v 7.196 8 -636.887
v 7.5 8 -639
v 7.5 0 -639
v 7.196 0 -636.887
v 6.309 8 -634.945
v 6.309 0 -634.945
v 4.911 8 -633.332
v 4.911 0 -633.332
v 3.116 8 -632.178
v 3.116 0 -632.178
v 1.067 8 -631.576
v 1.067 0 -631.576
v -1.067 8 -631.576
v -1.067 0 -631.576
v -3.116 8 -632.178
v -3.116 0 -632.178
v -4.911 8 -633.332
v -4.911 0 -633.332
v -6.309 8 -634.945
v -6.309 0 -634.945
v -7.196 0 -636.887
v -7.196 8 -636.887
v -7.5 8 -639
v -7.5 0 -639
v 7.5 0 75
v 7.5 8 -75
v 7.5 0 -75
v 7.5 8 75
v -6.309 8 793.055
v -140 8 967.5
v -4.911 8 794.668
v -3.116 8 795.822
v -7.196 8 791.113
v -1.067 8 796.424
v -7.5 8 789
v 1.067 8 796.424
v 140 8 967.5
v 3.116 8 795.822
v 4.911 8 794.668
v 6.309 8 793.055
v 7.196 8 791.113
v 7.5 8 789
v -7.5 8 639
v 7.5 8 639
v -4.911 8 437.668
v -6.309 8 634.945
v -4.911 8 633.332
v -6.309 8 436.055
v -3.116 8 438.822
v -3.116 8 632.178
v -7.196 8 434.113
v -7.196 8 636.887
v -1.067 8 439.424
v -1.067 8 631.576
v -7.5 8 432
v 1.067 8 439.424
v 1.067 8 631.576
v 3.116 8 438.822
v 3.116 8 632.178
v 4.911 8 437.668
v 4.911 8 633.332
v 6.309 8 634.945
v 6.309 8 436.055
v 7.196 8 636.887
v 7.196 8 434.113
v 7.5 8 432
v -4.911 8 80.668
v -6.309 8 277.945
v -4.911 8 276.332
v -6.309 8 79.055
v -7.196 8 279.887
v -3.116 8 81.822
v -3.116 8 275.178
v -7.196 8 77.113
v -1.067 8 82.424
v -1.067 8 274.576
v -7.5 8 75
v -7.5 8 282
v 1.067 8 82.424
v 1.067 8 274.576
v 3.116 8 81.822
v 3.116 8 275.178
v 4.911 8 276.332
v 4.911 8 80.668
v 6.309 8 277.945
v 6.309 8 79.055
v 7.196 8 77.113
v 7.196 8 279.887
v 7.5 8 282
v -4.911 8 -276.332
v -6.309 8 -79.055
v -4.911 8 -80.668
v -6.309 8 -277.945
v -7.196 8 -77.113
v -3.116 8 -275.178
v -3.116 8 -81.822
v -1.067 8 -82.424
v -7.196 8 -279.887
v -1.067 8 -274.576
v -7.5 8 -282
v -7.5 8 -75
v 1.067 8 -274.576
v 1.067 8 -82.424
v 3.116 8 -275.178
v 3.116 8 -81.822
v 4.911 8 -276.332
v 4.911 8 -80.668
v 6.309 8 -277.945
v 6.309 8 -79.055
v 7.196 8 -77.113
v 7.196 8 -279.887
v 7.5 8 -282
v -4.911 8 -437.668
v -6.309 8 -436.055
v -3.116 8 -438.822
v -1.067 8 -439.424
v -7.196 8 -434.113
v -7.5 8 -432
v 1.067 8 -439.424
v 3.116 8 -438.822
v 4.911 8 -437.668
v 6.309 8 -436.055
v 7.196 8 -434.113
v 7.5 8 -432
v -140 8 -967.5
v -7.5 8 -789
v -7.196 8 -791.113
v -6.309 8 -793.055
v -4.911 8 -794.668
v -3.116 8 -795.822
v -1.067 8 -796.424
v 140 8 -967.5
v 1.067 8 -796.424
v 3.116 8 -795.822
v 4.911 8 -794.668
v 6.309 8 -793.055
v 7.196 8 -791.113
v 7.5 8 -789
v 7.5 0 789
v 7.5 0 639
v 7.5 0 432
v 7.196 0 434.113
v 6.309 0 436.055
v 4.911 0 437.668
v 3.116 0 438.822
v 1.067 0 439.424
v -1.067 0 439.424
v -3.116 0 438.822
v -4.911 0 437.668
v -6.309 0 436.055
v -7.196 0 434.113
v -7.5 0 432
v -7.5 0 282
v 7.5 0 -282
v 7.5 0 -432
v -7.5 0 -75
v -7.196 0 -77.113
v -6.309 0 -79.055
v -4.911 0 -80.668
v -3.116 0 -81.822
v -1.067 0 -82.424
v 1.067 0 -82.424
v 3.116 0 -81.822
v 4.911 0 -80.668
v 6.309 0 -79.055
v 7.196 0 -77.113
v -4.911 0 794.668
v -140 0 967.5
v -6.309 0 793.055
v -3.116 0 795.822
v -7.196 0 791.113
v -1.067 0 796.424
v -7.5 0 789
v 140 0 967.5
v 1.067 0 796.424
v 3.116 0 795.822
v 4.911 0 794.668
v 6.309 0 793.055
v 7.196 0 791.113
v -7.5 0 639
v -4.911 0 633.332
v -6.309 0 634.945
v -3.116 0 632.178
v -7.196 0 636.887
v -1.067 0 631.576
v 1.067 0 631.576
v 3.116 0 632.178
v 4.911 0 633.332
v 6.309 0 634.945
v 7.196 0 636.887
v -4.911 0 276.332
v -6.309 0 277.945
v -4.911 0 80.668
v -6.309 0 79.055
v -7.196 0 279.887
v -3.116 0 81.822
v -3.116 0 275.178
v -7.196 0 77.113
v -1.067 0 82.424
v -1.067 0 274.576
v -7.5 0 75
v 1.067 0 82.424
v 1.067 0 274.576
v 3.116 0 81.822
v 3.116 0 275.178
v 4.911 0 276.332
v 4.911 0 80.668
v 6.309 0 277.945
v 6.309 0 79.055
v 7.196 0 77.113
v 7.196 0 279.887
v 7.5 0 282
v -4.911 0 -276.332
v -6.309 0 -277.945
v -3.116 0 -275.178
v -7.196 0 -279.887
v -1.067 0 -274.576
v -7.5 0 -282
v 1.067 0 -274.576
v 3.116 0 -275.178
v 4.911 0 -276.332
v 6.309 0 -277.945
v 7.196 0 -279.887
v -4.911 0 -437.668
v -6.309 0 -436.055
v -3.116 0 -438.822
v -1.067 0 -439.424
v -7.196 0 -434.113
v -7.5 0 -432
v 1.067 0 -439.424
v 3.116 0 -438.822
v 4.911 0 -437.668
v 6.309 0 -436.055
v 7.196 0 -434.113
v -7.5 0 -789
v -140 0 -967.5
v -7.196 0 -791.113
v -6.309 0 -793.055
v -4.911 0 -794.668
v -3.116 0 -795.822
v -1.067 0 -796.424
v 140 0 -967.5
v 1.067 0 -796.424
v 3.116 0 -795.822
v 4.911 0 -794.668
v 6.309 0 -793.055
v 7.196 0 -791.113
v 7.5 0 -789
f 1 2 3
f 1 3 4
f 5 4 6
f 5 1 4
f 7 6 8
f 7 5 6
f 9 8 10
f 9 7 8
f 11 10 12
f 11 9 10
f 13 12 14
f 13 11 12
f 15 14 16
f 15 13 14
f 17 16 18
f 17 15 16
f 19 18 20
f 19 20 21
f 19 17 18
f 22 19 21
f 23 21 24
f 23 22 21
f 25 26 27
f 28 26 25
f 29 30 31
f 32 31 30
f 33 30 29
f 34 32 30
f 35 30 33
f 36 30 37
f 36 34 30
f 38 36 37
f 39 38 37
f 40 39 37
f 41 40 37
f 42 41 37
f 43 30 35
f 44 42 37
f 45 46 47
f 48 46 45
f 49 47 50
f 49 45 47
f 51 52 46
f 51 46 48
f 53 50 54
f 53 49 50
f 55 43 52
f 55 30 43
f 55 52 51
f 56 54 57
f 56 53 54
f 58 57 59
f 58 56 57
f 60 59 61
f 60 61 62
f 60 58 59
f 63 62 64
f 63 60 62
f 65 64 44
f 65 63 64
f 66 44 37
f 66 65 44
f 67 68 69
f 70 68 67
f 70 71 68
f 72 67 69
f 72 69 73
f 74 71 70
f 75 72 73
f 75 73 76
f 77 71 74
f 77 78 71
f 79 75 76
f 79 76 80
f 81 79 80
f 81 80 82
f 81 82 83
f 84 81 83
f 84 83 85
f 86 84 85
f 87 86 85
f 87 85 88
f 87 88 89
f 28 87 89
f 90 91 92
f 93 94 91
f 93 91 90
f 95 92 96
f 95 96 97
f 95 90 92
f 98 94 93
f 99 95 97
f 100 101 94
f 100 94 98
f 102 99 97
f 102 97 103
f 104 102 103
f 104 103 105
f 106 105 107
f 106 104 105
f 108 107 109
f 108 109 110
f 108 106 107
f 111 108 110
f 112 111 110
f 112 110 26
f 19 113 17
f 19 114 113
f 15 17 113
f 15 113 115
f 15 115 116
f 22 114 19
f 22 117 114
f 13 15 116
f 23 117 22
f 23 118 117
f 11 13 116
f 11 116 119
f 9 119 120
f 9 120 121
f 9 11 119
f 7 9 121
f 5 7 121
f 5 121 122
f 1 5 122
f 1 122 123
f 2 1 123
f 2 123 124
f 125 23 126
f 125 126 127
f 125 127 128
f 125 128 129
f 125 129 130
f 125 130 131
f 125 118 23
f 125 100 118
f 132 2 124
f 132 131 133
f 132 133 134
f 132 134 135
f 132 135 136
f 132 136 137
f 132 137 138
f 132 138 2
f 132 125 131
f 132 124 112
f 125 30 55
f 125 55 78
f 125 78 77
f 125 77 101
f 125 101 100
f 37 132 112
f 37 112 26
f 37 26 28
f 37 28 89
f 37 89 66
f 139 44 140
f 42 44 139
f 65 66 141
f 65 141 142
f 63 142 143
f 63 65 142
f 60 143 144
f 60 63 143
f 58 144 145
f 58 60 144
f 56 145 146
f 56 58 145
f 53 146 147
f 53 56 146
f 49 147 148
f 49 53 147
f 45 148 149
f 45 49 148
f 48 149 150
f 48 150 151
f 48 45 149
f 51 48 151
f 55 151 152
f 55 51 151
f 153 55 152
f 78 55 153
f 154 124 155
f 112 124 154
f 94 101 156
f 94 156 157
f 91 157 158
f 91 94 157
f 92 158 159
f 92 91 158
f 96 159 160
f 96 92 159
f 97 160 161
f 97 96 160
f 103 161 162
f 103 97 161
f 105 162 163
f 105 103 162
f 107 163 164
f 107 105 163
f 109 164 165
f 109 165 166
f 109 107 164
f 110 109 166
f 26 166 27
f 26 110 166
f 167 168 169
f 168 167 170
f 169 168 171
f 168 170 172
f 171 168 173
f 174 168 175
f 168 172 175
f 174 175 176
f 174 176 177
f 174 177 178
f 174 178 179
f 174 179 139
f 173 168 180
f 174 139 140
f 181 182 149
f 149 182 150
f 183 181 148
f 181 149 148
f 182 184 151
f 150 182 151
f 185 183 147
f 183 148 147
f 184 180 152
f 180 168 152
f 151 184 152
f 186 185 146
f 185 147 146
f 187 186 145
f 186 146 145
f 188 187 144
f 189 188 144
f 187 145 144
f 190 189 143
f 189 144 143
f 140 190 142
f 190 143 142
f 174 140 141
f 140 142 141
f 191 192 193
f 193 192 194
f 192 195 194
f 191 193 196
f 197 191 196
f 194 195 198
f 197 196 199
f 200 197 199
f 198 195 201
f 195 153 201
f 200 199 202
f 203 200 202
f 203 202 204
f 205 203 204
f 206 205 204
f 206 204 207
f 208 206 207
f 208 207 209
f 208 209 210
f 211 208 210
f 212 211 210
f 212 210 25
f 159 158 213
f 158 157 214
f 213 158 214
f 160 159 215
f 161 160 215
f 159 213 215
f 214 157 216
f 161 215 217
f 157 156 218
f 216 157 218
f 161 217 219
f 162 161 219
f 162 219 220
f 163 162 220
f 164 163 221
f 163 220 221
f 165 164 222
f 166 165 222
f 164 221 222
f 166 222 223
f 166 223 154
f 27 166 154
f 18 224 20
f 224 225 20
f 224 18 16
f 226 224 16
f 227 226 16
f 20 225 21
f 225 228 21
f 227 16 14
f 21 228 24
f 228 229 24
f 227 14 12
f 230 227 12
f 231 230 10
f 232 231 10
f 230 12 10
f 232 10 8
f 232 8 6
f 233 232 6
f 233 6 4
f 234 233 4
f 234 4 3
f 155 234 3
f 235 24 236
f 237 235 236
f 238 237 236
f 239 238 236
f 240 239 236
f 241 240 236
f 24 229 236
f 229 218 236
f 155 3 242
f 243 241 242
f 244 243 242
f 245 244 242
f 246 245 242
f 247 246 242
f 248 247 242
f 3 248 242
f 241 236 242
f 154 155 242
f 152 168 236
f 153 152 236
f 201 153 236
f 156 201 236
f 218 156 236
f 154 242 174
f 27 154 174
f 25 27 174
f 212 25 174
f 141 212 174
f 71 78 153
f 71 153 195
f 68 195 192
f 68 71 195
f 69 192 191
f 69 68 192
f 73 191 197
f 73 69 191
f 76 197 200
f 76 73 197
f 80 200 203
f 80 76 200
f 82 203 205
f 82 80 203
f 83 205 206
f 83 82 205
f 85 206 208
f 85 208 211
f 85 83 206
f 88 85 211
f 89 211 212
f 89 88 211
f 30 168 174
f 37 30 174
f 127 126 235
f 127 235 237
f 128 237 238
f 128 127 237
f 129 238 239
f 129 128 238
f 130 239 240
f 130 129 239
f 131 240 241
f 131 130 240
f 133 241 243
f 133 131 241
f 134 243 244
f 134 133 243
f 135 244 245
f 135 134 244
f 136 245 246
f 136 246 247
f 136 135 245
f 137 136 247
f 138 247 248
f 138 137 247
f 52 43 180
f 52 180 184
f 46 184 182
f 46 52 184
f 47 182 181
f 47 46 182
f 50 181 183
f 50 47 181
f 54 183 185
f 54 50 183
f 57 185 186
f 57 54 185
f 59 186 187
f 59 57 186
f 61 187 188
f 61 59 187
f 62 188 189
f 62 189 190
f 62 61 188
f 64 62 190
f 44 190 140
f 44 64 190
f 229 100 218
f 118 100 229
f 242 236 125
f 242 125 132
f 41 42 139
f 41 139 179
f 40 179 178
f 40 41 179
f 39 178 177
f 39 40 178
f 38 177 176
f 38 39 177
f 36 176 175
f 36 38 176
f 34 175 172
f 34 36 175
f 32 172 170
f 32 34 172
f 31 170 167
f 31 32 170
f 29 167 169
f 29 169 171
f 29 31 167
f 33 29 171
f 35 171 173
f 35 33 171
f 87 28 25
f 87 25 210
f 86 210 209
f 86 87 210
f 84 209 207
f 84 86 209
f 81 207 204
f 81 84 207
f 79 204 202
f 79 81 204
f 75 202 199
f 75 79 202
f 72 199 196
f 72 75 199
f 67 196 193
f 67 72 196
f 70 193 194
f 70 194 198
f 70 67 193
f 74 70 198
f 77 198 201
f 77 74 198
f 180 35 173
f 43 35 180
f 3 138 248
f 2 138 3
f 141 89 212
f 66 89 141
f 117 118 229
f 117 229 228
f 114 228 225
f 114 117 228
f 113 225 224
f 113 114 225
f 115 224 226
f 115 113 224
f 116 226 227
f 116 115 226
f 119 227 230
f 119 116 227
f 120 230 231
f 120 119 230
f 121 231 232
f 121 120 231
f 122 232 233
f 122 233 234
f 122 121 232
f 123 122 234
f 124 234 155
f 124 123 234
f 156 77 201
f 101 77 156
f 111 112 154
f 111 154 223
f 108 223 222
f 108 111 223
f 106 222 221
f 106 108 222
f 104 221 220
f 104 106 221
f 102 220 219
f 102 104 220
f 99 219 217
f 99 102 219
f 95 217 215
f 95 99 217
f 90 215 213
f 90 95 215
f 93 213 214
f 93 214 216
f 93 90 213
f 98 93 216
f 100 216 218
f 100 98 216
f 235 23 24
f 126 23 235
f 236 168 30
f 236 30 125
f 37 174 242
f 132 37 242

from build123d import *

# Parameters (mm, degrees)
SKETCH_1_W             = 280
SKETCH_1_H             = 1935
EXTRUDE_1_DEPTH        = 8
CUT_EXTRUDE_1_DEPTH    = 8
PATTERN_LINEAR_1_COUNT = 5
PATTERN_LINEAR_1_PITCH = 357


with BuildPart() as part:
    # 草图1 → 凸台-拉伸1 (new body)
    with BuildSketch(Plane(origin=(0, 0, 0), x_dir=(1, 0, 0), z_dir=(0, 1, 0))):
        Rectangle(SKETCH_1_W, SKETCH_1_H)
    extrude(amount=EXTRUDE_1_DEPTH)

    # 草图2 → 切除-拉伸1 (cut)
    with BuildSketch(Plane(origin=(0, 8, 0), x_dir=(1, 0, 0), z_dir=(0, 1, 0))):
        with BuildLine():
            Line((-7.5, -789), (-7.5, -639))
            ThreePointArc((-7.5, -639), (0, -631.5), (7.5, -639))
            Line((7.5, -639), (7.5, -789))
            ThreePointArc((7.5, -789), (0, -796.5), (-7.5, -789))
        make_face()
    cut_extrude_1 = extrude(amount=-CUT_EXTRUDE_1_DEPTH, mode=Mode.SUBTRACT)

    # 阵列(线性)1: 切除-拉伸1 ×5
    with Locations(*[(0, 0, -i * PATTERN_LINEAR_1_PITCH) for i in range(1, PATTERN_LINEAR_1_COUNT)]):
        add(cut_extrude_1, mode=Mode.SUBTRACT)


solid = part.part
